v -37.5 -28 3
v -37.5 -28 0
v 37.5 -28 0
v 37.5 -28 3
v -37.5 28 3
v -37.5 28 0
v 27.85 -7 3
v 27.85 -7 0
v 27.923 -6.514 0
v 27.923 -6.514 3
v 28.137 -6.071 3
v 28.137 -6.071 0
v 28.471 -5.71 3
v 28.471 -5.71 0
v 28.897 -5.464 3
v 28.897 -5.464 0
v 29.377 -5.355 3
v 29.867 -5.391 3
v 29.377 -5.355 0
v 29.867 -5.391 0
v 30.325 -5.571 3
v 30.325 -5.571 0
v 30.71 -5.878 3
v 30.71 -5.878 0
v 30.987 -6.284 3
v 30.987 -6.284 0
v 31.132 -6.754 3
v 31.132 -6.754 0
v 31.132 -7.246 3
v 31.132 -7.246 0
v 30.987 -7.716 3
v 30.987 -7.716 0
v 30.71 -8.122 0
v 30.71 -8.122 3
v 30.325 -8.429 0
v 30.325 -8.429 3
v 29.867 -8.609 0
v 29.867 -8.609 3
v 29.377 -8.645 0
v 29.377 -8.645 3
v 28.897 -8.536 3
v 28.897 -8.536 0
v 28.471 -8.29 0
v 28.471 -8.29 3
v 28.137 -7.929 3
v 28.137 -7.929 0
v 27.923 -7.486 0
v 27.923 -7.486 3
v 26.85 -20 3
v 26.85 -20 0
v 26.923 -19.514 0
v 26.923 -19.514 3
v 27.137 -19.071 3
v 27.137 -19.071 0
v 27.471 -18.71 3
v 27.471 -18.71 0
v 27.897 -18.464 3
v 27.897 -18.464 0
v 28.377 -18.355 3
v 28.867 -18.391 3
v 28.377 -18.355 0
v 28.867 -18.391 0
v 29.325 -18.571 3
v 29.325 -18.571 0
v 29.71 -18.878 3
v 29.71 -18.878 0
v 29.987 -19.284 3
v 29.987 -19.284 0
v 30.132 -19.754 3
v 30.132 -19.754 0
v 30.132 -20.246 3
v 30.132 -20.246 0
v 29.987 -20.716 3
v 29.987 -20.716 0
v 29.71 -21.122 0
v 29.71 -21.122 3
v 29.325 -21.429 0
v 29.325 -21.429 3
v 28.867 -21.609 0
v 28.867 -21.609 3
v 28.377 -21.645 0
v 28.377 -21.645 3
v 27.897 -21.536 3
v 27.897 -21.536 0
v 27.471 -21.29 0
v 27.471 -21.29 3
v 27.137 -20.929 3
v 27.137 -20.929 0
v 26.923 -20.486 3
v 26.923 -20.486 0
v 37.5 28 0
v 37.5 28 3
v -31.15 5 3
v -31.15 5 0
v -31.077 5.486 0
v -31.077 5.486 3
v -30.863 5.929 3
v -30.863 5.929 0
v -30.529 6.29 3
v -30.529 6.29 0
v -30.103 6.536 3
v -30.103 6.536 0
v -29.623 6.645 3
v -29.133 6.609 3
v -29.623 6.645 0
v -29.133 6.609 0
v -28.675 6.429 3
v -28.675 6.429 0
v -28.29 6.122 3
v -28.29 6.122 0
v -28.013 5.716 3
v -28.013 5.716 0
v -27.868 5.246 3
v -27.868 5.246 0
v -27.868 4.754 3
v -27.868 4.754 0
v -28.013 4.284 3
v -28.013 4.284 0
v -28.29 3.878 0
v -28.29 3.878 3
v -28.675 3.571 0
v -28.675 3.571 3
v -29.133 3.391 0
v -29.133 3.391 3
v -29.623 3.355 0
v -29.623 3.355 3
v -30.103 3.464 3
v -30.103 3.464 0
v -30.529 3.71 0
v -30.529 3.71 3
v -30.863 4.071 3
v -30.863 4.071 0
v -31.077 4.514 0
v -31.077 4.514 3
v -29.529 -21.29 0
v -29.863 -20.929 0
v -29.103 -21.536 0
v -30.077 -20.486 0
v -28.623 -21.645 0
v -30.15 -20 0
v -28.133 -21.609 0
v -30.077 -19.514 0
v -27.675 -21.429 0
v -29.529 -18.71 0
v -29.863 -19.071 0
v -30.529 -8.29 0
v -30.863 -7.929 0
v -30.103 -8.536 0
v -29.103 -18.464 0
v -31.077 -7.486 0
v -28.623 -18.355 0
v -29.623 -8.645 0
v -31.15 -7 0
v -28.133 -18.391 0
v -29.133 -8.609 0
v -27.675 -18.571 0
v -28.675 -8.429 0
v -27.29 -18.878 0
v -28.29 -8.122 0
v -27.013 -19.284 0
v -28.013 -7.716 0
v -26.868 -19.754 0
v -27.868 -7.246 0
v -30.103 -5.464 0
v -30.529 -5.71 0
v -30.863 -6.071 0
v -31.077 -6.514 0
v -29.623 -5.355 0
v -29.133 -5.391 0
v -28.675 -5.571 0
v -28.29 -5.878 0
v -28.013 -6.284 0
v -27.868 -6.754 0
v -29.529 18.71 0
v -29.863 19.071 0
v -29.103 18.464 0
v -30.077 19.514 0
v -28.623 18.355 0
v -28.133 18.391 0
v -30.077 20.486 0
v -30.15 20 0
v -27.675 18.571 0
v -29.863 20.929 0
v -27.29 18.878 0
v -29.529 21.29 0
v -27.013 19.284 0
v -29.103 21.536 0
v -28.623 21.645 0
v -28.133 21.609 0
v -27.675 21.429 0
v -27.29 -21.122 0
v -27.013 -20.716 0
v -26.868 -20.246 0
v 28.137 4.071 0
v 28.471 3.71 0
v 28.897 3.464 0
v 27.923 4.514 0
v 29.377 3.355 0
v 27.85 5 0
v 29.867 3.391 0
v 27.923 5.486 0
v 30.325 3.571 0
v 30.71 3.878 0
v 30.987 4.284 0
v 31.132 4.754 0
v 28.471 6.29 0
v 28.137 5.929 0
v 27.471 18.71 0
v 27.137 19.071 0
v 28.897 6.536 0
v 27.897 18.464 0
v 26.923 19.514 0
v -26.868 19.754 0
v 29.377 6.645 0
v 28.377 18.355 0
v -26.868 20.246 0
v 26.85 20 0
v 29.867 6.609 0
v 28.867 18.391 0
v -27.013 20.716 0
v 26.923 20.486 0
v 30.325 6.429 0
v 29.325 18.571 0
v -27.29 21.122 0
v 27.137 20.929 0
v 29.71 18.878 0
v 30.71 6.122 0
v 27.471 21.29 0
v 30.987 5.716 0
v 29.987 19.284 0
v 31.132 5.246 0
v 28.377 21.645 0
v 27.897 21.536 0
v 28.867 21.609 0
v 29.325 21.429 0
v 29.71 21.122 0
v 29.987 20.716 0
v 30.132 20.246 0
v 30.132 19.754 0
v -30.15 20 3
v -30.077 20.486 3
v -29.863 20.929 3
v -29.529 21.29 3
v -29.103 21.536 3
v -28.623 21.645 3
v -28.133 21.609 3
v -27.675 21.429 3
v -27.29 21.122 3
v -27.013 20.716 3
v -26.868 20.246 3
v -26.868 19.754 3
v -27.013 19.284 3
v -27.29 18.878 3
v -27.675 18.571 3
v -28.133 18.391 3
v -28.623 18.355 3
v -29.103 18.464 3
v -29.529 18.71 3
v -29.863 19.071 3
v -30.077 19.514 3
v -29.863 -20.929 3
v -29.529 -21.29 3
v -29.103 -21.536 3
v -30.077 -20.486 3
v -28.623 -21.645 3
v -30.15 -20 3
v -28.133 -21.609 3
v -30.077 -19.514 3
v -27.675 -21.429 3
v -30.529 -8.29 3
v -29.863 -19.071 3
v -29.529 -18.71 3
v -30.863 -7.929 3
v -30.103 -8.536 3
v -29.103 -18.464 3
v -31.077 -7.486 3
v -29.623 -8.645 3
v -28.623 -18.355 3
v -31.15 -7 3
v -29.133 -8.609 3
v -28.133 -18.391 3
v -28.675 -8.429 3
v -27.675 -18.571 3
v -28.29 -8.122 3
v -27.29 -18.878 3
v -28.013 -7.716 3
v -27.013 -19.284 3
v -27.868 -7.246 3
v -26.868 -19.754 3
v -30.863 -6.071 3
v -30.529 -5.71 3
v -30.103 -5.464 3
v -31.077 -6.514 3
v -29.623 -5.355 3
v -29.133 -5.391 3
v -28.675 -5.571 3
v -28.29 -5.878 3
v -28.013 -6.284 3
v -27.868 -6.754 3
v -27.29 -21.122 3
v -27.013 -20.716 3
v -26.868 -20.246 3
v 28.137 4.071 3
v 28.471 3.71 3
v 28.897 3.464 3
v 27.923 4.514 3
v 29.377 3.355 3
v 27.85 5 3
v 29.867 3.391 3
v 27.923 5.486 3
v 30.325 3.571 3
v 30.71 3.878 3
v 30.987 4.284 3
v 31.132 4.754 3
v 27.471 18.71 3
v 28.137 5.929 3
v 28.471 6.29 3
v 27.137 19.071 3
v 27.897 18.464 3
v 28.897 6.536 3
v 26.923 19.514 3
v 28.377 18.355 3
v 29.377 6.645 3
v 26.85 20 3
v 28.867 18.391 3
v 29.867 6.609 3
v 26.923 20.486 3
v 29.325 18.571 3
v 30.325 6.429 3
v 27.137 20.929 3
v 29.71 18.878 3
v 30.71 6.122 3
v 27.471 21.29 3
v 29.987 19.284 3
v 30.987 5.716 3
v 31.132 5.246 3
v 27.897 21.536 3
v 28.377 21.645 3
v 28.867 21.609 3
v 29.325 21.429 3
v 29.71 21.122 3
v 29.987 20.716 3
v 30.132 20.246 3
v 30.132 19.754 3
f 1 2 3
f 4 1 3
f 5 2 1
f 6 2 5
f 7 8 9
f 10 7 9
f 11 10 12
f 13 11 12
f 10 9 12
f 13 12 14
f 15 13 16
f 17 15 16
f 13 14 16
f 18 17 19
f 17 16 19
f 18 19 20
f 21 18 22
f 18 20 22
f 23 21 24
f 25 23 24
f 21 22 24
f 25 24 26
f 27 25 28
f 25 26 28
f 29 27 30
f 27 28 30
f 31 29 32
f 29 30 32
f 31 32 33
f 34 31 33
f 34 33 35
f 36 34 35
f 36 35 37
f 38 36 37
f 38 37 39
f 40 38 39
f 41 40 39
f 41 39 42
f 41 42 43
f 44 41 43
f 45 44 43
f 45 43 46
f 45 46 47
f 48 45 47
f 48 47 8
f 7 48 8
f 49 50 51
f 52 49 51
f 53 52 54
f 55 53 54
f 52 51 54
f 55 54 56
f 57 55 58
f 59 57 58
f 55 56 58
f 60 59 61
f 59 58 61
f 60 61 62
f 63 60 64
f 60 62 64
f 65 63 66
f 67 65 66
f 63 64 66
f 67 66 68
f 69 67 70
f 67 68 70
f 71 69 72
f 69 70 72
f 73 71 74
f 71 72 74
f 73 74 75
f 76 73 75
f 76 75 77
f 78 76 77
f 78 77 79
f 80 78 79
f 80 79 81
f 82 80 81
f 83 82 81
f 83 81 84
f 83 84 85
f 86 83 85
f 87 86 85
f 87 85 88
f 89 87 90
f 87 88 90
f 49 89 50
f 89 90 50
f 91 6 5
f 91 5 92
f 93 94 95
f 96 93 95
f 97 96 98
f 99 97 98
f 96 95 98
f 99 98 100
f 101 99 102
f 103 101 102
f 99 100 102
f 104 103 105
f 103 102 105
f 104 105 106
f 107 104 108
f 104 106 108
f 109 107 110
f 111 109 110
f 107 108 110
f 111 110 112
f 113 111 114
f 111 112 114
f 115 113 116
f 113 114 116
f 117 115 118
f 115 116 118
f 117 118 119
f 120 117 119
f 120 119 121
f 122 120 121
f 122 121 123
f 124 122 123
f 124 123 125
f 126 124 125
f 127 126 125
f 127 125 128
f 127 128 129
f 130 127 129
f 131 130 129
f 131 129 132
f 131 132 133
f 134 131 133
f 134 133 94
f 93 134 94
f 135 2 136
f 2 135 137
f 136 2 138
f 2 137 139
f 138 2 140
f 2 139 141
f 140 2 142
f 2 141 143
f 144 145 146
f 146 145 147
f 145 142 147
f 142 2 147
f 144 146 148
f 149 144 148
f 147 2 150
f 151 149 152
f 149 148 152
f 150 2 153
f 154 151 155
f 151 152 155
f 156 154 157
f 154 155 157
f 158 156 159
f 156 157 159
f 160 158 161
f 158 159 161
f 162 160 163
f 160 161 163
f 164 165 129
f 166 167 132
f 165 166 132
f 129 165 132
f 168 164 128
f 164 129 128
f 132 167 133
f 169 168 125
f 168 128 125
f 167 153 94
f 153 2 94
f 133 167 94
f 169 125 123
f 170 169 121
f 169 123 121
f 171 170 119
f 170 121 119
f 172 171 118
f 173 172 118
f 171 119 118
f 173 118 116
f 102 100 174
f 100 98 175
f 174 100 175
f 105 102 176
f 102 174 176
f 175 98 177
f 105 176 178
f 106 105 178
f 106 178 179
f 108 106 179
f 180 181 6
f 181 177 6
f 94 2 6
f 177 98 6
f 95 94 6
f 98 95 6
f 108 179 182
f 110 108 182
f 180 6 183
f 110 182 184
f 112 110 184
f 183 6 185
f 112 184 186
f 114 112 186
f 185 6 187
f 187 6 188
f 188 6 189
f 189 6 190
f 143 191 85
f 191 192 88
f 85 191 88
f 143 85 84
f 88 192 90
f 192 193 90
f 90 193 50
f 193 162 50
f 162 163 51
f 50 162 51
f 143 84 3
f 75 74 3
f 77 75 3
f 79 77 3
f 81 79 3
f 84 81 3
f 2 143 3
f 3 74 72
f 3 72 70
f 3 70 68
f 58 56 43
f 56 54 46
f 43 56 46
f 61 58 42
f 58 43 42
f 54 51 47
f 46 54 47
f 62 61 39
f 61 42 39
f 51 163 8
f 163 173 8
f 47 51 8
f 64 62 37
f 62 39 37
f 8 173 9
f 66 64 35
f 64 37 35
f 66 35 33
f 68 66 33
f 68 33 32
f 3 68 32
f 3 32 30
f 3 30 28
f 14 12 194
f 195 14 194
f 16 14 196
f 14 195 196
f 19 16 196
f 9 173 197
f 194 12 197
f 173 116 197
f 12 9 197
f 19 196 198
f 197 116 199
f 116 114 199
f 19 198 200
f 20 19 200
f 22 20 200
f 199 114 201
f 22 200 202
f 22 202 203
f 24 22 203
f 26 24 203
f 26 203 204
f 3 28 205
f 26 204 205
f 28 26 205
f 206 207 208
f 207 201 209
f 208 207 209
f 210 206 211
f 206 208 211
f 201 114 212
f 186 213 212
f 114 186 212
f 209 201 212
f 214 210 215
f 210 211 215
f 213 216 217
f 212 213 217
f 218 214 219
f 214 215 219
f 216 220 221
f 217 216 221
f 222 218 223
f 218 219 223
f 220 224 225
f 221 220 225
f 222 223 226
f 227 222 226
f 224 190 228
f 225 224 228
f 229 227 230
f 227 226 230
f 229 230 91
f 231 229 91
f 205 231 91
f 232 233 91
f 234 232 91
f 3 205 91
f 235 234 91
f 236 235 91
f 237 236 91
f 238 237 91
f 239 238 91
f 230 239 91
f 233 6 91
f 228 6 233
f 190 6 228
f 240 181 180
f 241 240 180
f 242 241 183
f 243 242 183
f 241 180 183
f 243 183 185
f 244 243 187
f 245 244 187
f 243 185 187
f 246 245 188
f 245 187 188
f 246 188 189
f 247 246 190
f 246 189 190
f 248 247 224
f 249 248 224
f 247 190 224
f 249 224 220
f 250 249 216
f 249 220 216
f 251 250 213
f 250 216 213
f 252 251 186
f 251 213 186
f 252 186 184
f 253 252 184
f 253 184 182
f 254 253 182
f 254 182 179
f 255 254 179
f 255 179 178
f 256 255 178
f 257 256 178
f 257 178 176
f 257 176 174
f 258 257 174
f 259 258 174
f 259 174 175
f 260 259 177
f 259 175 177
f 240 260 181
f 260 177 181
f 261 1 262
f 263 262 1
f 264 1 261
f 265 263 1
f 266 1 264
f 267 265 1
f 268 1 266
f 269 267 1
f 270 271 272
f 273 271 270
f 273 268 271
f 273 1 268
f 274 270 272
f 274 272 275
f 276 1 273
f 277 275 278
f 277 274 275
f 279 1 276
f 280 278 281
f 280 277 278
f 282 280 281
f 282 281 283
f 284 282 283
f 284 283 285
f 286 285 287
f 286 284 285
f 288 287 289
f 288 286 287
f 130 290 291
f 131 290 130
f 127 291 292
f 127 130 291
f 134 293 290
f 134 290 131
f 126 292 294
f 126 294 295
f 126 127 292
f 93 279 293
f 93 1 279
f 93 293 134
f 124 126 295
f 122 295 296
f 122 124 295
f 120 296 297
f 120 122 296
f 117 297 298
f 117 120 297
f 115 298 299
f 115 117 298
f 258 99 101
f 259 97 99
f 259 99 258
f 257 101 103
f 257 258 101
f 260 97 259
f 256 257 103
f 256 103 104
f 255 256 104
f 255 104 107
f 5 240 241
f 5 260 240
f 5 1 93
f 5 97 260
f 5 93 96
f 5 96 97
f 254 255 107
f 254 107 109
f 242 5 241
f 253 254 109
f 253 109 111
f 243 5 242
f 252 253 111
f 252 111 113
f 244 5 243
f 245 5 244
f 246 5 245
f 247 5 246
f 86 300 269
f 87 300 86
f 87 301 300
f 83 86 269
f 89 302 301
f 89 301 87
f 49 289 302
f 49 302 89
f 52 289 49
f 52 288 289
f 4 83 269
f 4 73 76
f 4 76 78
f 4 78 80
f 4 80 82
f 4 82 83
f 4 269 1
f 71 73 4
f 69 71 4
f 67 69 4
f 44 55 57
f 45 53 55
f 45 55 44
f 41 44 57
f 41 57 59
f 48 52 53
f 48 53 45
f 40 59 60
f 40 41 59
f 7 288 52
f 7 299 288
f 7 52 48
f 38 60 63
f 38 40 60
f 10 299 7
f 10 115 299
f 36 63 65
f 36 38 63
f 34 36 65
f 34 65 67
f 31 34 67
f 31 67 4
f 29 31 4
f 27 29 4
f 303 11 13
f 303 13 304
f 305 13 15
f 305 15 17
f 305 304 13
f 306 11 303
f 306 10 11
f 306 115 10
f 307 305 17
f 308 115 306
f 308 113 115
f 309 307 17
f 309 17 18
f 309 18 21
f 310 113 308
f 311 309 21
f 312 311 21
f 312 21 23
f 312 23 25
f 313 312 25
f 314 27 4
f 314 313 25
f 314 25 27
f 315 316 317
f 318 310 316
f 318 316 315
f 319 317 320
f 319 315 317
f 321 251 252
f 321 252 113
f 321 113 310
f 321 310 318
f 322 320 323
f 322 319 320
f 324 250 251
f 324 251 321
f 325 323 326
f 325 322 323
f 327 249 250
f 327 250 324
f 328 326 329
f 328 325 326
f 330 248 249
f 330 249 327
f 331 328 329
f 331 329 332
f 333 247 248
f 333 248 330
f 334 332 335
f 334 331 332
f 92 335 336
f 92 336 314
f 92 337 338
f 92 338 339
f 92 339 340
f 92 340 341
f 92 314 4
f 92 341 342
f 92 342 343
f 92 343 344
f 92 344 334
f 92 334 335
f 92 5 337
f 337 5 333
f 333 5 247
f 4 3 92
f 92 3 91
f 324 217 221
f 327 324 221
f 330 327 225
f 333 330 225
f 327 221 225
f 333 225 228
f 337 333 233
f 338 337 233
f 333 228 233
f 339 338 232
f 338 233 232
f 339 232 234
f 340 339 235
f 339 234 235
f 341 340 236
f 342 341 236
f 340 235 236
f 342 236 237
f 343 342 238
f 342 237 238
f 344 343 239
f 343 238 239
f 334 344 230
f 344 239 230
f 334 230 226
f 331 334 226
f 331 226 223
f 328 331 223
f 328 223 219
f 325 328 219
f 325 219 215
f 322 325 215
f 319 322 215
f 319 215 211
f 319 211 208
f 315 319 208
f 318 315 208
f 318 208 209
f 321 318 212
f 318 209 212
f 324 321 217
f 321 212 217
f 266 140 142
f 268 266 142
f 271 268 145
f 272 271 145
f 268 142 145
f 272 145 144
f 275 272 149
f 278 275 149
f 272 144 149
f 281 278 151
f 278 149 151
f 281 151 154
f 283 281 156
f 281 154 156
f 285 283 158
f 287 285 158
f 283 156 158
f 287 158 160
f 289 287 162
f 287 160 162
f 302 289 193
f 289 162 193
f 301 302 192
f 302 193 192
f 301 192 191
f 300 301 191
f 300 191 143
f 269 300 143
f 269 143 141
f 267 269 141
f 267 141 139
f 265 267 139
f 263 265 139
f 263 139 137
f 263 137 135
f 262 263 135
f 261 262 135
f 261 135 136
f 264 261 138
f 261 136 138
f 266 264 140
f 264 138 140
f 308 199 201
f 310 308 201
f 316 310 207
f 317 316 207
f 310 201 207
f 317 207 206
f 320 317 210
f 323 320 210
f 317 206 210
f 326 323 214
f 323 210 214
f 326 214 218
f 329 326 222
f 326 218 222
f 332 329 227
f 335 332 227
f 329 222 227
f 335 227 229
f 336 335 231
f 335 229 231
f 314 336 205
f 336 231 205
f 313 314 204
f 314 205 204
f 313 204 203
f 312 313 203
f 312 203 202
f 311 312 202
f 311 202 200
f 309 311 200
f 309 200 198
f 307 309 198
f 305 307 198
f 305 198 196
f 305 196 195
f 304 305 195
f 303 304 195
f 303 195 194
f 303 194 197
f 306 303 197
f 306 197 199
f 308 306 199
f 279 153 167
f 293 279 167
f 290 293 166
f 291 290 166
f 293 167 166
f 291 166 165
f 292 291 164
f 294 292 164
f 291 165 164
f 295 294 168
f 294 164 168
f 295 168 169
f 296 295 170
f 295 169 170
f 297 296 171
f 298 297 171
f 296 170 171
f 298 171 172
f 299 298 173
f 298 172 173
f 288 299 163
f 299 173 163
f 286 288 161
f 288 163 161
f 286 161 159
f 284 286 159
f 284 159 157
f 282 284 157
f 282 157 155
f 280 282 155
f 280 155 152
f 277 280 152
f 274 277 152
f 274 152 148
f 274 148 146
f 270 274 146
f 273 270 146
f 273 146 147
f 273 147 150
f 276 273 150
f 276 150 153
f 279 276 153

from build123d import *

# Parameters (mm, degrees)
SKETCH_1_W          = 75
SKETCH_1_H          = 56
EXTRUDE_1_DEPTH     = 3
SKETCH_2_R          = 1.65
CUT_EXTRUDE_1_DEPTH = 3
SKETCH_4_R          = 1.65
CUT_EXTRUDE_3_DEPTH = 8


with BuildPart() as part:
    # 草图1 → 凸台-拉伸1 (new body)
    with BuildSketch(Plane.XY):
        Rectangle(SKETCH_1_W, SKETCH_1_H)
    extrude(amount=EXTRUDE_1_DEPTH)

    # 草图2 → 切除-拉伸1 (cut)
    with BuildSketch(Plane(origin=(0, 0, 0), x_dir=(-1, 0, 0), z_dir=(0, 0, -1))):
        with Locations((-28.5, 20)):
            Circle(SKETCH_2_R)
        with Locations((28.5, 20)):
            Circle(SKETCH_2_R)
        with Locations((-28.5, -20)):
            Circle(SKETCH_2_R)
        with Locations((28.5, -20)):
            Circle(SKETCH_2_R)
    extrude(amount=-CUT_EXTRUDE_1_DEPTH, mode=Mode.SUBTRACT)

    # 草图4 → 切除-拉伸3 (cut)
    with BuildSketch(Plane(origin=(0, 0, 0), x_dir=(-1, 0, 0), z_dir=(0, 0, -1))):
        with Locations((-29.5, 5)):
            Circle(SKETCH_4_R)
        with Locations((29.5, 5)):
            Circle(SKETCH_4_R)
        with Locations((-29.5, -7)):
            Circle(SKETCH_4_R)
        with Locations((29.5, -7)):
            Circle(SKETCH_4_R)
    extrude(amount=-CUT_EXTRUDE_3_DEPTH, mode=Mode.SUBTRACT)


solid = part.part
